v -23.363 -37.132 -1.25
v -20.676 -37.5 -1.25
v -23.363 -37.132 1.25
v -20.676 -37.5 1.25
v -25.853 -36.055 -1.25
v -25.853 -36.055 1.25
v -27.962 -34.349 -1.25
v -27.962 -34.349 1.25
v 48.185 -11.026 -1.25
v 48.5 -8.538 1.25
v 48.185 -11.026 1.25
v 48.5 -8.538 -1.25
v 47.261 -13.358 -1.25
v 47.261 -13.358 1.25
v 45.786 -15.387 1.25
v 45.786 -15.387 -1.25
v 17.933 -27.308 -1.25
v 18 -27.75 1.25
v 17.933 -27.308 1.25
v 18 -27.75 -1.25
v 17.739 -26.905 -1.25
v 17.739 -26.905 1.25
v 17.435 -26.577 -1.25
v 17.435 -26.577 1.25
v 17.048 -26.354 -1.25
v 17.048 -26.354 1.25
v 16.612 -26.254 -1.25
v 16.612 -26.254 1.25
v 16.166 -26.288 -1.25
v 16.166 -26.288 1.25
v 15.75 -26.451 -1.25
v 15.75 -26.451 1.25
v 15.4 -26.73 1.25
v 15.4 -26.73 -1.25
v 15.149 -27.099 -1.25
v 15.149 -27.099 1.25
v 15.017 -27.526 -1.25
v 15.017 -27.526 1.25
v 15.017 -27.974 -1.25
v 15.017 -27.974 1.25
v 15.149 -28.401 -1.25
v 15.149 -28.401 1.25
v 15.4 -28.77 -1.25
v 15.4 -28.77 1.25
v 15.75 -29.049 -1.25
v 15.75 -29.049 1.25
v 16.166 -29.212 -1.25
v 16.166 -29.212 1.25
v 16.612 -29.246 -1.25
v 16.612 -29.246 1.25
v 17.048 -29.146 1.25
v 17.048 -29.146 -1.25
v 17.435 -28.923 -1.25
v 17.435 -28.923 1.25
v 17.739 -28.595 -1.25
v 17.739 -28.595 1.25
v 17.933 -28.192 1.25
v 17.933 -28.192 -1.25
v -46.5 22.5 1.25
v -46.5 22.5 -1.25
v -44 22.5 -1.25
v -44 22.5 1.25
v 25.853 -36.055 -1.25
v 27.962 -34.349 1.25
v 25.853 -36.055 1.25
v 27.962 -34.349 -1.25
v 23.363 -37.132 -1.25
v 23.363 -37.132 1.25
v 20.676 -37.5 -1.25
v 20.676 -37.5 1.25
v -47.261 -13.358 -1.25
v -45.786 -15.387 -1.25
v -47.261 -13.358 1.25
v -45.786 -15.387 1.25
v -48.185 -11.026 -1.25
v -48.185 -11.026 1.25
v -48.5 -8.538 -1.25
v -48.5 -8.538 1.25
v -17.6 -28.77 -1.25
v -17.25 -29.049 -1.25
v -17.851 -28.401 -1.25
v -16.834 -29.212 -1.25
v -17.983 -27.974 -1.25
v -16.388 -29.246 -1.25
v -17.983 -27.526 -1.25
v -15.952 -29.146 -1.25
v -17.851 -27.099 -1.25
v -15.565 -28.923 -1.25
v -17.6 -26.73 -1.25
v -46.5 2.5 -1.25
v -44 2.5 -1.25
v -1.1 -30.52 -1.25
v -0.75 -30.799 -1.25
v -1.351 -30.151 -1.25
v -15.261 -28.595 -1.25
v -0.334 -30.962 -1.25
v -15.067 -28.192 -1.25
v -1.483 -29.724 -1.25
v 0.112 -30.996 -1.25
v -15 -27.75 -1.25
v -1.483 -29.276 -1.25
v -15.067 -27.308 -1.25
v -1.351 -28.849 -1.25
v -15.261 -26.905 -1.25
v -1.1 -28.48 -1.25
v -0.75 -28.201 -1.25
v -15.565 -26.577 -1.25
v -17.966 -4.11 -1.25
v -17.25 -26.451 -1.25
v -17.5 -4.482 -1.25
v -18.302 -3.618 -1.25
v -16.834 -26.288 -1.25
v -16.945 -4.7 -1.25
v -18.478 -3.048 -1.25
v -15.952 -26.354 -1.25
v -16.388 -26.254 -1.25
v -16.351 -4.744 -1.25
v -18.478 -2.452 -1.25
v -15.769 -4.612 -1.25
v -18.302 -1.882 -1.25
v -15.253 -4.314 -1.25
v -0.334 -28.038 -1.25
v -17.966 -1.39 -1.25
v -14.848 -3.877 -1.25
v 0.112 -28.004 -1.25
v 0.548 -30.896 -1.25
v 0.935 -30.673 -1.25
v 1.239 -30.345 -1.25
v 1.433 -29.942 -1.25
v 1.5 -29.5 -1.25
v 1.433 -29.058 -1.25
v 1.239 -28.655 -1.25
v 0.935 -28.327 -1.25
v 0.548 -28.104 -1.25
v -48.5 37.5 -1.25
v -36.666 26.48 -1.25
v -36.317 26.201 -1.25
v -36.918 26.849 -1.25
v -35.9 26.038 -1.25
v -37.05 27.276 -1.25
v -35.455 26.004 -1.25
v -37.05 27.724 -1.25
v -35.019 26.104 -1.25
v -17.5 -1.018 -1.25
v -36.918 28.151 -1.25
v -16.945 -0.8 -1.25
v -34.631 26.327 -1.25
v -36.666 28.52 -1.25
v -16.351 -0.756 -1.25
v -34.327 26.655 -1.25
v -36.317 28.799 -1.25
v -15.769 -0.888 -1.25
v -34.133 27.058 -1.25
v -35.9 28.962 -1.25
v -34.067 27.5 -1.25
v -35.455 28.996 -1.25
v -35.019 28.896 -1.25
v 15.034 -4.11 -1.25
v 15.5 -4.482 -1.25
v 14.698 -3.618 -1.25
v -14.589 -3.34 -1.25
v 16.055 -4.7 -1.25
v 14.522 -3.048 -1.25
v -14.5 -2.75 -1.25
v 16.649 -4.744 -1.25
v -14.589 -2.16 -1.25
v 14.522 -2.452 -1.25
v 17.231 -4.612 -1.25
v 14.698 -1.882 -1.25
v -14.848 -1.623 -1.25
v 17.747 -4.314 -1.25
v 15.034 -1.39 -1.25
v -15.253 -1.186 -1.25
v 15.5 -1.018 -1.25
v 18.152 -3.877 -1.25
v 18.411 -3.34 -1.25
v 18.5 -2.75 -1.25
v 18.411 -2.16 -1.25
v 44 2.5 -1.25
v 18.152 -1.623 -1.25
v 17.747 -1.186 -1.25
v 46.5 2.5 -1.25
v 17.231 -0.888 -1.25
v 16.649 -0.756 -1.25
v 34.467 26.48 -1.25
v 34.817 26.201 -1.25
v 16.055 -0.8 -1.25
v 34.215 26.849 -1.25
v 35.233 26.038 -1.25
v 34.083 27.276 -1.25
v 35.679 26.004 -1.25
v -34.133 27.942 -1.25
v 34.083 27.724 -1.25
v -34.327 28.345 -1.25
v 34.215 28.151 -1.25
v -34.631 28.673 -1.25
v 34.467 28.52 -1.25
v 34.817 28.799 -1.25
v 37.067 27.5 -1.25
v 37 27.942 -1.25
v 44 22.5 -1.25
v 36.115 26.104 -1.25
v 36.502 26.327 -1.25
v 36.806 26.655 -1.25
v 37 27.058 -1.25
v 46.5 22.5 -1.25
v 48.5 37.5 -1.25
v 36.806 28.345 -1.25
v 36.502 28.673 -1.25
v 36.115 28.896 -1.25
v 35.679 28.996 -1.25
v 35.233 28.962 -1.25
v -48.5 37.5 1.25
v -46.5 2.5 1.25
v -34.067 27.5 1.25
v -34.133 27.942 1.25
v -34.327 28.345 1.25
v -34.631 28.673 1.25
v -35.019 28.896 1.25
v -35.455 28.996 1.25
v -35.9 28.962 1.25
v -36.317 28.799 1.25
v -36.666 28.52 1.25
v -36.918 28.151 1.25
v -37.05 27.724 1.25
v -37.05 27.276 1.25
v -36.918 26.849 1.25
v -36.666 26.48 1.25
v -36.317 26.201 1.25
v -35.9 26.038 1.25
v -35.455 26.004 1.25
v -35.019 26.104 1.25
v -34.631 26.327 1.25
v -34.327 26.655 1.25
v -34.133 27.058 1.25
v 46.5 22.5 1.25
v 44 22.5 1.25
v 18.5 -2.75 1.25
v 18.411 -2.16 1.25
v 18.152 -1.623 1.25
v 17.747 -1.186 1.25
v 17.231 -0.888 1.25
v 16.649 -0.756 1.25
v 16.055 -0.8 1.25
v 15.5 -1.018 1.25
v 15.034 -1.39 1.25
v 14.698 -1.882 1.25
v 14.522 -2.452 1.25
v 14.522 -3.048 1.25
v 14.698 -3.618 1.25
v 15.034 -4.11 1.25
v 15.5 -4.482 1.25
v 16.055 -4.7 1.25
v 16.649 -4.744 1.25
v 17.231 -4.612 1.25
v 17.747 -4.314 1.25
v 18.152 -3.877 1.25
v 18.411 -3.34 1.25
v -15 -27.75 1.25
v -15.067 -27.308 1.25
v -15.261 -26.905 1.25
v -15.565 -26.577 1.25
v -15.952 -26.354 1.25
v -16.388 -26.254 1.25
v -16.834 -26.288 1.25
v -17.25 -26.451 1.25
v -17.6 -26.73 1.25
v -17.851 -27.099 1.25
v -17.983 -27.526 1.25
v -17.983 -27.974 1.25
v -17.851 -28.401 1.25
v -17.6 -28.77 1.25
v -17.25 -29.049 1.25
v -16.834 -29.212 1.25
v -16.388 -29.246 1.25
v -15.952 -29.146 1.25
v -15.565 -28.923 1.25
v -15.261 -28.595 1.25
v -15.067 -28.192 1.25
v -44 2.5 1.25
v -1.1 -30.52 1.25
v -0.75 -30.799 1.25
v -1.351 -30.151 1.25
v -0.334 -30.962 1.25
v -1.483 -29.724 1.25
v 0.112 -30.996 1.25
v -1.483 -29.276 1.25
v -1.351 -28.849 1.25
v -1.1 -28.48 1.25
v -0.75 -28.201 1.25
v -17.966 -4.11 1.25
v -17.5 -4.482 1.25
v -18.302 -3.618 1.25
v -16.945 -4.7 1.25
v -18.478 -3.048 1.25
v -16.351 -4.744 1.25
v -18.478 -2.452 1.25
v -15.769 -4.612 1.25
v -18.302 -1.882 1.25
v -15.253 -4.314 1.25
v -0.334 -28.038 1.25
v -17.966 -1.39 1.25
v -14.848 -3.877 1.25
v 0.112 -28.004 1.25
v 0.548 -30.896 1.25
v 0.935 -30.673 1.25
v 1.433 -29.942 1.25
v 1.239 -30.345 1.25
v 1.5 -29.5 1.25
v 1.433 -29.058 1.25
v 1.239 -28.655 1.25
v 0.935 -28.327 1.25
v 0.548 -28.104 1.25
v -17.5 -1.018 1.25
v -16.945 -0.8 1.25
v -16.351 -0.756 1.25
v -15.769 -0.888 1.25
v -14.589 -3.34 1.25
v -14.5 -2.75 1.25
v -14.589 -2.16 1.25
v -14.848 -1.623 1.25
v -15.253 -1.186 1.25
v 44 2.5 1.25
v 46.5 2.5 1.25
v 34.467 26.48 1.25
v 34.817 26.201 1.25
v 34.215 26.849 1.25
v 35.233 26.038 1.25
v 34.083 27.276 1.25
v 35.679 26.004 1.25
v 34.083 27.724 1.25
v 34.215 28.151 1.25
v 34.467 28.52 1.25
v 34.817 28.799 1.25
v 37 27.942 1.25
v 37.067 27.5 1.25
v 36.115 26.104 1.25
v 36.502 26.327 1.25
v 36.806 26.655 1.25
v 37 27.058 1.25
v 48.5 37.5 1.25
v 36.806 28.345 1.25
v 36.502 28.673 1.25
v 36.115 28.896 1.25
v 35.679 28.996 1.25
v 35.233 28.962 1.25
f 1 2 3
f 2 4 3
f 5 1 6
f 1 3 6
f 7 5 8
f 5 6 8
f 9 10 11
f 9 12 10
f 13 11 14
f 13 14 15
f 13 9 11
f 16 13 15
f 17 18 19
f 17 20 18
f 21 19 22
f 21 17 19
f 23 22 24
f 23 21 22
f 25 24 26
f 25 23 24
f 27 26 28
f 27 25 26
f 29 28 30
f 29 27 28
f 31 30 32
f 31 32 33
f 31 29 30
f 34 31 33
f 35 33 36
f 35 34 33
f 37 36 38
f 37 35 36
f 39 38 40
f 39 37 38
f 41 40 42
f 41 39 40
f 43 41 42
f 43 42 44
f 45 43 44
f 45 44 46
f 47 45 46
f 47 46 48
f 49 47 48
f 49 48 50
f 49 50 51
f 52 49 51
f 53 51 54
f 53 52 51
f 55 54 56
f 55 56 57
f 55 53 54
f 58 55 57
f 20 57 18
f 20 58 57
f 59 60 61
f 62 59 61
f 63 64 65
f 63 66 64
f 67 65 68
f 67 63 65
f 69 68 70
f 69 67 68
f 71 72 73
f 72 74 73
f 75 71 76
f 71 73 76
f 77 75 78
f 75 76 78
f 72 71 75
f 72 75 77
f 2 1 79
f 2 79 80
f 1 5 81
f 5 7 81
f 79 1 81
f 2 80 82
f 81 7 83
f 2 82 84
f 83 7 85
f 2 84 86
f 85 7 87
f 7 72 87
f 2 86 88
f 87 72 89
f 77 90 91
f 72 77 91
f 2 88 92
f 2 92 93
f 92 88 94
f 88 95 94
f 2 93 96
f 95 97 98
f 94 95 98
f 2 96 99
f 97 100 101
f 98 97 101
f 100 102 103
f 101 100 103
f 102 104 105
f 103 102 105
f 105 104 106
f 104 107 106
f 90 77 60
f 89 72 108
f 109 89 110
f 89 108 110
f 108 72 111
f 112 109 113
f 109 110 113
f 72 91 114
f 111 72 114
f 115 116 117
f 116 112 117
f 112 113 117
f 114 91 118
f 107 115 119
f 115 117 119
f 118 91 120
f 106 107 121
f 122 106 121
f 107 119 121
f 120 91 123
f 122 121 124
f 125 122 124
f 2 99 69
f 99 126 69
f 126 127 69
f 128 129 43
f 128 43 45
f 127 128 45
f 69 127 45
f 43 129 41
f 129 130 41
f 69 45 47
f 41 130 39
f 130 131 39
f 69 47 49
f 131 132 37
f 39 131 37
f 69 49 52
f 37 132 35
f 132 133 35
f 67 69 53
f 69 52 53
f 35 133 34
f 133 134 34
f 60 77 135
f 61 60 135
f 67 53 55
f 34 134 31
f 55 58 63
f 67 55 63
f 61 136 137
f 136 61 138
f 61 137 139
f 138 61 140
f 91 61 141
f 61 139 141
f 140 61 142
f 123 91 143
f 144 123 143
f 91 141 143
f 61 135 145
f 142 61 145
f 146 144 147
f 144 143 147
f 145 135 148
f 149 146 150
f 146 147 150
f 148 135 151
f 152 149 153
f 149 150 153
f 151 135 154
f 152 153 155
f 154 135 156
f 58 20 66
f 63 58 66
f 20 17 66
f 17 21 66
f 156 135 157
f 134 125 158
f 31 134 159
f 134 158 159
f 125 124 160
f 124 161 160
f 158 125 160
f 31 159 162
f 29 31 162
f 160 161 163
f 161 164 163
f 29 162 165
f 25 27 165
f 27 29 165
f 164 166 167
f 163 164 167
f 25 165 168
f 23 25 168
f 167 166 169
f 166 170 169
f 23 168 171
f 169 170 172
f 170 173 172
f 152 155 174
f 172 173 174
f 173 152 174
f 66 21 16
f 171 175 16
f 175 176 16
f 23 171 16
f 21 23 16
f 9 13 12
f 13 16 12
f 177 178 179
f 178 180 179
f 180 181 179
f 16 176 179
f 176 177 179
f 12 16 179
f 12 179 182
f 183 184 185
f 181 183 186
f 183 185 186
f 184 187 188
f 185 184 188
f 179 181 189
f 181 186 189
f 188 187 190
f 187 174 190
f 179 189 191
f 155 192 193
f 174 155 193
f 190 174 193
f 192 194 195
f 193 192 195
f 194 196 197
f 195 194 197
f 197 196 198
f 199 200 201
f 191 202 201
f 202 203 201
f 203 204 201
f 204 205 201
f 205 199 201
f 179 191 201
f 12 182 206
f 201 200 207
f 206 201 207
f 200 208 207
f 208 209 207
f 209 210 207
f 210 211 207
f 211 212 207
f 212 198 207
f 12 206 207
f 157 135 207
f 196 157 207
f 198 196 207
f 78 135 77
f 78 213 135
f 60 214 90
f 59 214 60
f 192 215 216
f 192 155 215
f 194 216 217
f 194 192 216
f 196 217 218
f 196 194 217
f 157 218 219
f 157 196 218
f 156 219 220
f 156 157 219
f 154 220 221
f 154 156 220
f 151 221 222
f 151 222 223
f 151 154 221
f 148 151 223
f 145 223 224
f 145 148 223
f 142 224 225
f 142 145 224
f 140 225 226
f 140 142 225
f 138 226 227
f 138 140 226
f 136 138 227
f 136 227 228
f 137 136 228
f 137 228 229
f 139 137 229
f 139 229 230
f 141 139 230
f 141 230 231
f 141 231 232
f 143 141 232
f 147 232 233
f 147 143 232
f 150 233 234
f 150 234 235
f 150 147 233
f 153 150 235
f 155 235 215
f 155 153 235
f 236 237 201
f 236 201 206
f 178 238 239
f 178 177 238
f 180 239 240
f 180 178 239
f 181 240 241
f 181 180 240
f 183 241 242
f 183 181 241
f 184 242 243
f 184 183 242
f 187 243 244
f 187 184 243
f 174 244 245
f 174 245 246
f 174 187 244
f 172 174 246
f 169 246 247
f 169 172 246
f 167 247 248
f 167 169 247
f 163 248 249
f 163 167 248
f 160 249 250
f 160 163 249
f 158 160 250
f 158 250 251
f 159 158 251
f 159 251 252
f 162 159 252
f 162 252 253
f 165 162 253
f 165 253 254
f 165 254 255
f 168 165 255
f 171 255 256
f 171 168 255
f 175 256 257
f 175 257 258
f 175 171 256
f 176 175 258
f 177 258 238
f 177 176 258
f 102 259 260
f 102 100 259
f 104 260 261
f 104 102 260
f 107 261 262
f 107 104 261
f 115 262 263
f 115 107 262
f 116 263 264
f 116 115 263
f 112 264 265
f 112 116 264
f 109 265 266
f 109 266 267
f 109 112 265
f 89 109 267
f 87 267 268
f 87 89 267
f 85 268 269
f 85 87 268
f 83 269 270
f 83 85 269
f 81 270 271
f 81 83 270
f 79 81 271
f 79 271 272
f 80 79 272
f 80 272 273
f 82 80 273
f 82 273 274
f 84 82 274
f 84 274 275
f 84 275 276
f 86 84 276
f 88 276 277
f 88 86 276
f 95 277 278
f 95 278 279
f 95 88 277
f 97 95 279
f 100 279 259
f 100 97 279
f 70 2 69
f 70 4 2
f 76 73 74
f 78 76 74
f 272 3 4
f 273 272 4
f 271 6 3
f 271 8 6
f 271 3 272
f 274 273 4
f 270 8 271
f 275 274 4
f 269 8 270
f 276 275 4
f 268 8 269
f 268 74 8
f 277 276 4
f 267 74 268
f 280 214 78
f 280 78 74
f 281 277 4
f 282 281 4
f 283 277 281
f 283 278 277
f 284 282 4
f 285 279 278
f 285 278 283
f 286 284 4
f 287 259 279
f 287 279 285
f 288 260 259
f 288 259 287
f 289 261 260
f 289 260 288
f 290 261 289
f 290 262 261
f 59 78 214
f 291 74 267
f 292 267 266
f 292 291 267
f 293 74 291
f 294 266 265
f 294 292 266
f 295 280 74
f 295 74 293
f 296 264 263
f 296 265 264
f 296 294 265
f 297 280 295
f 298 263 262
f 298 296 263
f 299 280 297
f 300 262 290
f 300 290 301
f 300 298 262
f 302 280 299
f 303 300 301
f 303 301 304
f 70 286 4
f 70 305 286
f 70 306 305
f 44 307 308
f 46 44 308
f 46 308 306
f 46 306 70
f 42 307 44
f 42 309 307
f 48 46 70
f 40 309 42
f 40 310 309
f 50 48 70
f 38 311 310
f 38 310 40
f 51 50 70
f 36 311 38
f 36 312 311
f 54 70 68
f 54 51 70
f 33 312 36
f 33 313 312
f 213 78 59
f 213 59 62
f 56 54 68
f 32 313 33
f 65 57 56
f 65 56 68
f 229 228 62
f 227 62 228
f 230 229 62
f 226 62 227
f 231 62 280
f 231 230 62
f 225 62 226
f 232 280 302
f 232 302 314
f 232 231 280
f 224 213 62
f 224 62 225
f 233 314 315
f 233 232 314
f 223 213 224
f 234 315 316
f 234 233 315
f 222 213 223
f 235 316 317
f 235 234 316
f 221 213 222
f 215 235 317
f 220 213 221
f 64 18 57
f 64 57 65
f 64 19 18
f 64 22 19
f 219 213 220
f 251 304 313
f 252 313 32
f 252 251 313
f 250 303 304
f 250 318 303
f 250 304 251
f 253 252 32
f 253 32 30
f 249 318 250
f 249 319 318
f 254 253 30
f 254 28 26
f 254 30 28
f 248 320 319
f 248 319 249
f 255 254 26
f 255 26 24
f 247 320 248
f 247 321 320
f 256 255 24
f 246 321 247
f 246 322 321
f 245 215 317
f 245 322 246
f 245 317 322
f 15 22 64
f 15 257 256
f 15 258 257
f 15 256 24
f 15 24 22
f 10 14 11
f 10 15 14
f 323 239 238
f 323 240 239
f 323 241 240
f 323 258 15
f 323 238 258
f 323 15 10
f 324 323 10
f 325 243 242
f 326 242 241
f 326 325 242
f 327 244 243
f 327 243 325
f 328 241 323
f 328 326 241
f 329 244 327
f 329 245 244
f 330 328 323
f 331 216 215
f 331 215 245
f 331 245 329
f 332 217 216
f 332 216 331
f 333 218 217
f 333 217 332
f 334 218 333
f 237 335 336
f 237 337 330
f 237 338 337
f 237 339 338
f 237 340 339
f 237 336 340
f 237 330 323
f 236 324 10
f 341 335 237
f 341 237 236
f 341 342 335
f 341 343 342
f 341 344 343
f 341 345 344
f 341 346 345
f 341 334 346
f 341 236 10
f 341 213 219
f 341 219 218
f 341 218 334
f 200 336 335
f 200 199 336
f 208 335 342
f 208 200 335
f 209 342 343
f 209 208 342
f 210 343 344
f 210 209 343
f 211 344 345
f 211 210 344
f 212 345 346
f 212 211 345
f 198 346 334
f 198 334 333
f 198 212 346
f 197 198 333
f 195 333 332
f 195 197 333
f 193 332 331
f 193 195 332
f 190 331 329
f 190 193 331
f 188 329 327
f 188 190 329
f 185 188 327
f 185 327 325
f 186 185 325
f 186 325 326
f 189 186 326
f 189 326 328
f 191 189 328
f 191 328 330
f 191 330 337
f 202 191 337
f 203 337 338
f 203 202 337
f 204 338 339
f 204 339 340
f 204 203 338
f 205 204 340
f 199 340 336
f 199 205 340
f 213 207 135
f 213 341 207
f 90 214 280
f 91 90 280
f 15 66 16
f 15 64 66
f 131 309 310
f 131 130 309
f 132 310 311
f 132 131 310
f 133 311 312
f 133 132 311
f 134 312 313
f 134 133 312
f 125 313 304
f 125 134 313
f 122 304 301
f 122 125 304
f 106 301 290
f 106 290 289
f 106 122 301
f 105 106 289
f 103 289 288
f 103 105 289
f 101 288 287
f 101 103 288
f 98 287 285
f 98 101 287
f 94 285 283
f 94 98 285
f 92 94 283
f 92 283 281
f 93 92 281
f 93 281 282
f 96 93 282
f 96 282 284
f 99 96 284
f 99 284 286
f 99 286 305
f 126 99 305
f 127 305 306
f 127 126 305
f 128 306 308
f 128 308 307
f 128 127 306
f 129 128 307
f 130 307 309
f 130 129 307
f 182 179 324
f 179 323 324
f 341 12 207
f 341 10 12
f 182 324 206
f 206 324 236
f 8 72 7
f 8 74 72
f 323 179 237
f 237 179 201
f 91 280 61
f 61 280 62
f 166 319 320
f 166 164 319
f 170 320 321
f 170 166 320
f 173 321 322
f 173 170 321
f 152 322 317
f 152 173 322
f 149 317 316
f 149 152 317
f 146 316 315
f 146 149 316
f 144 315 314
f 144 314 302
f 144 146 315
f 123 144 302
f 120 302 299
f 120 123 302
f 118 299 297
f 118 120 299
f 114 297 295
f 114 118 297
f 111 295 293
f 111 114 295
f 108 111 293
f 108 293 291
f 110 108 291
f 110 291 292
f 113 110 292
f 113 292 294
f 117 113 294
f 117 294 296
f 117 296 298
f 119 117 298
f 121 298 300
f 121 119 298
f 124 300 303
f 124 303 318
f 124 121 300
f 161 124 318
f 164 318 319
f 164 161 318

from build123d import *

# Parameters (mm, degrees)
SKETCH1_3_R         = 1.5
SKETCH1_3_R_2       = 2
SKETCH1_3_W         = 2.5
SKETCH1_3_H         = 20
BOSS_EXTRUDE2_DEPTH = 1.25
FILLET2_R           = 10


with BuildPart() as part:
    # Sketch1<3> → Boss-Extrude2 (new, symmetric)
    with BuildSketch(Plane.XY):
        Polygon((48.5, -12.5), (48.5, 37.5), (-48.5, 37.5), (-48.5, -12.5), (-25, -37.5), (25, -37.5), align=None)
        with Locations((0, -29.5)):
            Circle(SKETCH1_3_R, mode=Mode.SUBTRACT)
        with Locations((-16.5, -27.75)):
            Circle(SKETCH1_3_R, mode=Mode.SUBTRACT)
        with Locations((16.5, -27.75)):
            Circle(SKETCH1_3_R, mode=Mode.SUBTRACT)
        with Locations((16.5, -2.75)):
            Circle(SKETCH1_3_R_2, mode=Mode.SUBTRACT)
        with Locations((-45.25, 12.5)):
            Rectangle(SKETCH1_3_W, SKETCH1_3_H, mode=Mode.SUBTRACT)
        with Locations((-35.566666667, 27.5)):
            Circle(SKETCH1_3_R, mode=Mode.SUBTRACT)
        with Locations((45.25, 12.5)):
            Rectangle(SKETCH1_3_W, SKETCH1_3_H, mode=Mode.SUBTRACT)
        with Locations((35.566666667, 27.5)):
            Circle(SKETCH1_3_R, mode=Mode.SUBTRACT)
        with Locations((-16.5, -2.75)):
            Circle(SKETCH1_3_R_2, mode=Mode.SUBTRACT)
    extrude(amount=BOSS_EXTRUDE2_DEPTH, both=True)

    # Fillet2
    fillet2_edges = [part.edges().sort_by_distance(p)[0] for p in [
        (48.5, -12.5, 0),
        (25, -37.5, 0),
        (-25, -37.5, 0),
        (-48.5, -12.5, 0),
    ]]
    fillet(fillet2_edges, radius=FILLET2_R)


solid = part.part
